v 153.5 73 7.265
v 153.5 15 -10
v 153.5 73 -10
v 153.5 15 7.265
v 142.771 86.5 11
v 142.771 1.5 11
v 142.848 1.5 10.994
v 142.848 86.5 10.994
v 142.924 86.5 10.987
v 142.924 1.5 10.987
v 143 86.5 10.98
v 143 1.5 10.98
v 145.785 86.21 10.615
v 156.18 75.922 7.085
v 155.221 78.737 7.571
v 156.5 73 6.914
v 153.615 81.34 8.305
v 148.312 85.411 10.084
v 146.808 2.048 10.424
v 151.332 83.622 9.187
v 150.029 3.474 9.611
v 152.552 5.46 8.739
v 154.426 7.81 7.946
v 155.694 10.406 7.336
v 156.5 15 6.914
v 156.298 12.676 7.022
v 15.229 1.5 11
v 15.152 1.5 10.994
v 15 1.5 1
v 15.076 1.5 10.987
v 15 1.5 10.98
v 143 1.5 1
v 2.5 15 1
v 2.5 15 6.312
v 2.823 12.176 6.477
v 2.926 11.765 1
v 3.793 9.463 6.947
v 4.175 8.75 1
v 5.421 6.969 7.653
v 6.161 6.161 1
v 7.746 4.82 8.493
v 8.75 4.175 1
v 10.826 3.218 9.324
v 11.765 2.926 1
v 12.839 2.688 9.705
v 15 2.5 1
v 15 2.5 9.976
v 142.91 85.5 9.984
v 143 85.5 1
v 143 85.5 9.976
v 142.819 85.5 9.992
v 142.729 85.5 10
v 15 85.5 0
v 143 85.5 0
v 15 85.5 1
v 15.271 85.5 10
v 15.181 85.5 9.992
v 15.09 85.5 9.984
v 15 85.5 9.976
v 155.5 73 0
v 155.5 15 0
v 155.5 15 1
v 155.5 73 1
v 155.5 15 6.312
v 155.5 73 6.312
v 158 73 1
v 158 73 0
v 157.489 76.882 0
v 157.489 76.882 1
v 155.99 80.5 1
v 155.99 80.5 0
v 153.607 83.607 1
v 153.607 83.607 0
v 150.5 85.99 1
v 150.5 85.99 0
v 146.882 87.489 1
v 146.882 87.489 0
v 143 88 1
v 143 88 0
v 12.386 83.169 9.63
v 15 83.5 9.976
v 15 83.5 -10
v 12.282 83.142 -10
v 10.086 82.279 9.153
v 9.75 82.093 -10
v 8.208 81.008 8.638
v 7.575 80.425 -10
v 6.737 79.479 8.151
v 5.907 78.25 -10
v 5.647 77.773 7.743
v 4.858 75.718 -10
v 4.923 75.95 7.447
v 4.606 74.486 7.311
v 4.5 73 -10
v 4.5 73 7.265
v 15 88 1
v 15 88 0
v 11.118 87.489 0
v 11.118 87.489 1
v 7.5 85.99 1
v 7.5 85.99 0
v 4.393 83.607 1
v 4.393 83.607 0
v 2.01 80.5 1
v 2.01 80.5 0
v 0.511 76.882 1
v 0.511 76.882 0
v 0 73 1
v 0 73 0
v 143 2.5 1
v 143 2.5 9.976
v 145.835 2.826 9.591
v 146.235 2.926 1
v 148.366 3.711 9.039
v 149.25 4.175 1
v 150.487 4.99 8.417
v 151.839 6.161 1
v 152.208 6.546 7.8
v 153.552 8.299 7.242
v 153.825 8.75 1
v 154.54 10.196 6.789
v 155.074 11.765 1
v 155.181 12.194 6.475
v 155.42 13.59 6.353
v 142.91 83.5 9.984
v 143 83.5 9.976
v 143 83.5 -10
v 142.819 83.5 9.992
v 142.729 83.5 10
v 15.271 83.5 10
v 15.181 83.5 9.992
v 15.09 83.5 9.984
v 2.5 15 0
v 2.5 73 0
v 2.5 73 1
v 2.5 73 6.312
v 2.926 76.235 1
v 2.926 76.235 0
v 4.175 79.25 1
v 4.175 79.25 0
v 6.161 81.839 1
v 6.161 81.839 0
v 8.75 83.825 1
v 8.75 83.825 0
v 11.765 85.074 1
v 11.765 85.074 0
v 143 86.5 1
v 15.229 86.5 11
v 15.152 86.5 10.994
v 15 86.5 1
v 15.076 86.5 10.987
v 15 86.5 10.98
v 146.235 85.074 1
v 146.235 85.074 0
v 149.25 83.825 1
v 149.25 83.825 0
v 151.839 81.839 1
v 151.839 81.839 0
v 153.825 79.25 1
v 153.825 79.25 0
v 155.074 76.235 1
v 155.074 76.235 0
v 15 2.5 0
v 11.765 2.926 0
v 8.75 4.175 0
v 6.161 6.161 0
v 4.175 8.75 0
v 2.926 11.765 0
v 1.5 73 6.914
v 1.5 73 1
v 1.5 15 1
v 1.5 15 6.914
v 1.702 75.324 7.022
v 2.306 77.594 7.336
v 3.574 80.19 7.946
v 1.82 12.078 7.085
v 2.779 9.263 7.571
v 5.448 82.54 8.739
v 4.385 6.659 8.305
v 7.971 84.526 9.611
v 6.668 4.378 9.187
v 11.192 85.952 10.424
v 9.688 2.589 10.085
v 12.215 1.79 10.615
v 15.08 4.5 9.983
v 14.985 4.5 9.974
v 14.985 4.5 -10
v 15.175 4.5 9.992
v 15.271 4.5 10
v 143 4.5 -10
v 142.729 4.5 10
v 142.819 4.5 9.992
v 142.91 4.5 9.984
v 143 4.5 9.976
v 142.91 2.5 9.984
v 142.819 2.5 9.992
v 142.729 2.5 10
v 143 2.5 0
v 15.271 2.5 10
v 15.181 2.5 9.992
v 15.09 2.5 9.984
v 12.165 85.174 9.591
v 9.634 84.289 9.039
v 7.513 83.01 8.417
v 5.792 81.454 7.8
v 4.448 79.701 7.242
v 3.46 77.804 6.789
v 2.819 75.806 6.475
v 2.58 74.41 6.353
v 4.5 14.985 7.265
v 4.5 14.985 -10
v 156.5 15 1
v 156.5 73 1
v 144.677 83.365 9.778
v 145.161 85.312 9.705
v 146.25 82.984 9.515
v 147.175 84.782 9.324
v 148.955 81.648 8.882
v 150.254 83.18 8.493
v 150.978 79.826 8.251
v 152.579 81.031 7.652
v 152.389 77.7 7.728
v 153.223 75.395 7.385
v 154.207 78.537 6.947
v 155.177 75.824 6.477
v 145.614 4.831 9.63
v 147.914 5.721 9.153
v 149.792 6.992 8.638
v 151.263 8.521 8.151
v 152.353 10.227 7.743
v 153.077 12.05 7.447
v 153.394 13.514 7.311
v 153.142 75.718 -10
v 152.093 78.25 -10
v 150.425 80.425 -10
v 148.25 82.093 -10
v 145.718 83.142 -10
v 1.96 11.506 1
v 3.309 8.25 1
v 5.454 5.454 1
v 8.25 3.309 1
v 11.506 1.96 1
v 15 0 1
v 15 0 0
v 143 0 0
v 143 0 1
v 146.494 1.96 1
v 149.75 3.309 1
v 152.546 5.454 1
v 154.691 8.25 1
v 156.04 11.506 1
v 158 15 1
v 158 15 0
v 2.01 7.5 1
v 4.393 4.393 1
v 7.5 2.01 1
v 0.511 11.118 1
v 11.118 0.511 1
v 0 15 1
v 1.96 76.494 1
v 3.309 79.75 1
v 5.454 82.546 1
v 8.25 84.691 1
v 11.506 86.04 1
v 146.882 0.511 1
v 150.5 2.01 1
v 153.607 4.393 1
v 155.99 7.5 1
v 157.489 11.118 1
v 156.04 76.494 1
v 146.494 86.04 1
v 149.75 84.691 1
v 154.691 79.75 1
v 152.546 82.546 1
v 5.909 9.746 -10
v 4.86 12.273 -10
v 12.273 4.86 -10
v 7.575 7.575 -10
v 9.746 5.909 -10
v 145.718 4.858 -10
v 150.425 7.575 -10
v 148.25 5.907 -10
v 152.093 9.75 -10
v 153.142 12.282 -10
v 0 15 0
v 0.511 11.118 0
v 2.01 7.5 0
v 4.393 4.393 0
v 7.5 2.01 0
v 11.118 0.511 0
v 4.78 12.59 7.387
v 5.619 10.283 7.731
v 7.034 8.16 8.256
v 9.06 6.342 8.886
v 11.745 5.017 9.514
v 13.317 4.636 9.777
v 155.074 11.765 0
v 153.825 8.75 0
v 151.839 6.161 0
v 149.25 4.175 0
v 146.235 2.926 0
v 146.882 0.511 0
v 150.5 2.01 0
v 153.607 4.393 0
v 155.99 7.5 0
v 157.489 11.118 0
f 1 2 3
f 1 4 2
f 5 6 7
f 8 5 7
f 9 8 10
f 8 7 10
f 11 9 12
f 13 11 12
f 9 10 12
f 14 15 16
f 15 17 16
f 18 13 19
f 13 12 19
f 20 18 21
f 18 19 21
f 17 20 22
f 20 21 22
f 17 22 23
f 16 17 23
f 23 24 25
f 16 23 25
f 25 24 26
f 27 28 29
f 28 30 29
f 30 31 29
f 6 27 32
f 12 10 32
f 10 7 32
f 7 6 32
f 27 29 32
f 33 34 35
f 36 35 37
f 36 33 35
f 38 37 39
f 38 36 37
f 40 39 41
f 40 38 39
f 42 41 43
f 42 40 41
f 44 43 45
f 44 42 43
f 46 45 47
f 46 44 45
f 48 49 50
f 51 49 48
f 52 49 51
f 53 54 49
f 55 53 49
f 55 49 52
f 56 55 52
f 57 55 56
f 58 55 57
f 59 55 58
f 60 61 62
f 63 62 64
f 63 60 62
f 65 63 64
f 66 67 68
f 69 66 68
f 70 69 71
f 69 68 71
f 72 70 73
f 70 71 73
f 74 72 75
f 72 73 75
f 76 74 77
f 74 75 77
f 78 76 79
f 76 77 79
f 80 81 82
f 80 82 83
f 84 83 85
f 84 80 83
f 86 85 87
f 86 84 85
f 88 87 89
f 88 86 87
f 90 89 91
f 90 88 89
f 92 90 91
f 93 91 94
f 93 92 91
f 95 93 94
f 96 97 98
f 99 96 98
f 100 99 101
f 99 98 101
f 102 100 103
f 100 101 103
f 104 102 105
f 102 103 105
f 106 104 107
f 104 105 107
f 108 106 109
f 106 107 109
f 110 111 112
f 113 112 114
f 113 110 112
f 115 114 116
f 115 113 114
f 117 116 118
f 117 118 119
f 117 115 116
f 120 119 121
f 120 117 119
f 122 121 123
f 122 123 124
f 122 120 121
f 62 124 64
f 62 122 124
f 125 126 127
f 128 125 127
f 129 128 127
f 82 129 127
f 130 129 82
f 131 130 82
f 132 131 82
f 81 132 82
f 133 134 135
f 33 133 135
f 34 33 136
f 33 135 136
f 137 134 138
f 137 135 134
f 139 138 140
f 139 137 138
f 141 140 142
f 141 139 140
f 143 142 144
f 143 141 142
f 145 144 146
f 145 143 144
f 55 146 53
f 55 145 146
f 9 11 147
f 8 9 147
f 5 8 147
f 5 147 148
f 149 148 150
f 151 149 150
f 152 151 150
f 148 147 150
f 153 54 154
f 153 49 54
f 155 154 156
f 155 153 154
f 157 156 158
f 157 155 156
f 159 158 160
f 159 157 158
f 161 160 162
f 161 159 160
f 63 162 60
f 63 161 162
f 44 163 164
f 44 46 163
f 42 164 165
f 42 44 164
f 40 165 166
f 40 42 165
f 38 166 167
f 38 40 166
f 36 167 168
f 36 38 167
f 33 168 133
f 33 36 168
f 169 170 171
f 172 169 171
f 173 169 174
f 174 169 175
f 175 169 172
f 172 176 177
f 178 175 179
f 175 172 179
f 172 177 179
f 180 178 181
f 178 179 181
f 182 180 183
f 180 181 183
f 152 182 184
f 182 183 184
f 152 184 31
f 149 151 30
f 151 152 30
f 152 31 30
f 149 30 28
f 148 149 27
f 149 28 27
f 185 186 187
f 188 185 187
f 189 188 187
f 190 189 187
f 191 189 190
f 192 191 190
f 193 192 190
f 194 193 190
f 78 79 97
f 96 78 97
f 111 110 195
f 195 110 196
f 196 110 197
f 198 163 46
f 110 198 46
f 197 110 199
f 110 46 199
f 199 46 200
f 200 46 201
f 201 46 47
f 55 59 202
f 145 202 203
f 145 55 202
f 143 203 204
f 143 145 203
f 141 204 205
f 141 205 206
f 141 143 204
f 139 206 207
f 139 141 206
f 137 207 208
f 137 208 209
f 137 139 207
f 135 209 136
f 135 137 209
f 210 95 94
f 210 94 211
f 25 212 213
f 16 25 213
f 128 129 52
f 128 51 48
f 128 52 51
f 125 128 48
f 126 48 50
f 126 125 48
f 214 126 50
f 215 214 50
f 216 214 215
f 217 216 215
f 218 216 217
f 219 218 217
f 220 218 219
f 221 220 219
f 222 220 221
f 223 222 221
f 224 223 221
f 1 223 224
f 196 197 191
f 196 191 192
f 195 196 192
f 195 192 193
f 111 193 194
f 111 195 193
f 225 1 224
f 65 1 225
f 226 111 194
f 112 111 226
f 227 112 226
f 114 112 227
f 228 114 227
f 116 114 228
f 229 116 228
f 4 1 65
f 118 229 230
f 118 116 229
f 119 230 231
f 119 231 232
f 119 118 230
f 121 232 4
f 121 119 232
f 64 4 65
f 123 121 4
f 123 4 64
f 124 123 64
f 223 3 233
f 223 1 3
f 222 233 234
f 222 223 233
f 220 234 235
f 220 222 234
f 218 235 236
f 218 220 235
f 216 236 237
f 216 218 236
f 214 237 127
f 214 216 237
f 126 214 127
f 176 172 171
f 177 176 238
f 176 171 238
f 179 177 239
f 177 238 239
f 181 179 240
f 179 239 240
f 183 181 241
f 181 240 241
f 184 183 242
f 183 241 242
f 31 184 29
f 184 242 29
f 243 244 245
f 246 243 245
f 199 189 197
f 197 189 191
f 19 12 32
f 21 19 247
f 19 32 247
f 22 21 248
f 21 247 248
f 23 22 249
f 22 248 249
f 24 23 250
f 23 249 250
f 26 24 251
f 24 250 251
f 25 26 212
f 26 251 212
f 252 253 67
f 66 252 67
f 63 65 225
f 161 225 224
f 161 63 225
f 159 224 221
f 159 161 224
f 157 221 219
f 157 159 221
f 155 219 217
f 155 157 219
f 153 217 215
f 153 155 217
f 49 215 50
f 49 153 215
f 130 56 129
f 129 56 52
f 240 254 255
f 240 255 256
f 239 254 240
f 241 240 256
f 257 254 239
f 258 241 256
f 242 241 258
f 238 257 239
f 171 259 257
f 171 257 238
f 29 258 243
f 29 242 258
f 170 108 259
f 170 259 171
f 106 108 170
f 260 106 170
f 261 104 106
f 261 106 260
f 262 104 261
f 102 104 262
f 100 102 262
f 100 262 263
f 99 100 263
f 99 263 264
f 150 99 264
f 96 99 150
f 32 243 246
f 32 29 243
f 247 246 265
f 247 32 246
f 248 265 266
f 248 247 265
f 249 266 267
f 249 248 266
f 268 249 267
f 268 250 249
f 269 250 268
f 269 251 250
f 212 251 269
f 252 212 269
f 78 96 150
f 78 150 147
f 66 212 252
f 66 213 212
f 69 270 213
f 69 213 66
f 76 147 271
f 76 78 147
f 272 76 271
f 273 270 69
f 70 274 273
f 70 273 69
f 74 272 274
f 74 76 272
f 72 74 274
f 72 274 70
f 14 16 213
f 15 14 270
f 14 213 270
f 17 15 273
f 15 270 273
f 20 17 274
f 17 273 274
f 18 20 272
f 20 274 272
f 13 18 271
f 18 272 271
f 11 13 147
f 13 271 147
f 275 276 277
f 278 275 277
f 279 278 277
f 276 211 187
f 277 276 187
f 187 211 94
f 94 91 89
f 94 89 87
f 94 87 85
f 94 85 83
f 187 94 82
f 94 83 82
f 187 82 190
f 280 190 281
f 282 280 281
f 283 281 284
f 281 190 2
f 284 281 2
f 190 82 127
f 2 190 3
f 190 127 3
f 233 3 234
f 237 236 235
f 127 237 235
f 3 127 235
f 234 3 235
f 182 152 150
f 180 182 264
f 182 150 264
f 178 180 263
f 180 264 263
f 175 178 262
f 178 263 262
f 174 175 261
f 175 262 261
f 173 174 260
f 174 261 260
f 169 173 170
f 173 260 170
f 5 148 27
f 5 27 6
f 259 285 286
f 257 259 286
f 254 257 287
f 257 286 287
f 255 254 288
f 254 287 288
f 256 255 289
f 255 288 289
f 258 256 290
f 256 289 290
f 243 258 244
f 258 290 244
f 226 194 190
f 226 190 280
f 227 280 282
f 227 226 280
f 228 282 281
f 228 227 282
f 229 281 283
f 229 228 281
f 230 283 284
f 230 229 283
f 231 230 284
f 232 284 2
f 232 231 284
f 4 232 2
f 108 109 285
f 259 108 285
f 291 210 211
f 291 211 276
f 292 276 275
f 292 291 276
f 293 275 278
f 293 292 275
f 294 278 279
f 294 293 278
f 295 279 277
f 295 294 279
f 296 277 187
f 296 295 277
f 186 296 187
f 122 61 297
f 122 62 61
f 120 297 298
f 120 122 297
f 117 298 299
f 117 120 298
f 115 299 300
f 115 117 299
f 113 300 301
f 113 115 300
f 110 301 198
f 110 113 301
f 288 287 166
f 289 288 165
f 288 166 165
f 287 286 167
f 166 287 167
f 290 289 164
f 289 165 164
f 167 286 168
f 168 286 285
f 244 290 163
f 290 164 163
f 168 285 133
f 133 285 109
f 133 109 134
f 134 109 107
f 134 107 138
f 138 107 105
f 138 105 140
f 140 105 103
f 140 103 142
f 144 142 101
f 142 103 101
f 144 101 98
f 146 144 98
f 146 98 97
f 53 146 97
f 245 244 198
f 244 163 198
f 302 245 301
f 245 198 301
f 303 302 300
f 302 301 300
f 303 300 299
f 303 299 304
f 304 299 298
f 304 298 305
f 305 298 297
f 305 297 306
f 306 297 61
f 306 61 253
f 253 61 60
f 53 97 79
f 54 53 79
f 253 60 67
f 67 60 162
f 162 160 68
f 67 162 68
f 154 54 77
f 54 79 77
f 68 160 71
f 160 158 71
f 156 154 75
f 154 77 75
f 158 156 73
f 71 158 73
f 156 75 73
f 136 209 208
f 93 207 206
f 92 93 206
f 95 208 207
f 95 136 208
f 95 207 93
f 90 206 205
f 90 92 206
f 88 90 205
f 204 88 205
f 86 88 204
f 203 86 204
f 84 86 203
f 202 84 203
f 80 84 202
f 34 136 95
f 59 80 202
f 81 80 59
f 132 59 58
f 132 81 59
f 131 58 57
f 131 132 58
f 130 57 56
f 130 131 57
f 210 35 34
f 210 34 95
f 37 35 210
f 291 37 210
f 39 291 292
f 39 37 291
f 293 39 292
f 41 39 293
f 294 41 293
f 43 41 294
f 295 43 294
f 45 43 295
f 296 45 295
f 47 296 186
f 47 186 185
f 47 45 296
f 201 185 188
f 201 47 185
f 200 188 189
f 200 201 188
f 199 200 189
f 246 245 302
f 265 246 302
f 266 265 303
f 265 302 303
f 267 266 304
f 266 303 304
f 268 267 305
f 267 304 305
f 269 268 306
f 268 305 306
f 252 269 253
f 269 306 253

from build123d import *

# Parameters (mm, degrees)
F1_DEPTH     = 1
F2_DEPTH     = 11
F4_DEPTH     = 88.001
F5_T         = 1
F5_T3_DEPTH  = 130
F5_T5_DEPTH  = 60
F5_T8_ANGLE  = 90.000000001
F5_T10_ANGLE = 90.000000001
F5_T12_ANGLE = 90.000000001
F5_T14_ANGLE = 90.000000001
F8_DEPTH     = 10


# Not quite as in the source:
# - a shell that OpenCascade refuses in one call is made with other operations: the cavity is built on its own and cut out


with BuildPart() as f1:
    # F0 (on Top) → F1 (new body)
    with BuildSketch(Plane.XY):
        with BuildLine():
            ThreePointArc((0, 15), (4.3933982822, 4.3933982822), (15, 0))
            Line((15, 0), (143, 0))
            ThreePointArc((143, 0), (153.6066017178, 4.3933982822), (158, 15))
            Line((158, 15), (158, 73))
            ThreePointArc((158, 73), (153.6066017178, 83.6066017178), (143, 88))
            Line((143, 88), (15, 88))
            ThreePointArc((15, 88), (4.3933982822, 83.6066017178), (0, 73))
            Line((0, 73), (0, 15))
        make_face()
        with BuildLine():
            ThreePointArc((1.5, 73), (5.454058454, 82.545941546), (15, 86.5))
            Line((15, 86.5), (143, 86.5))
            ThreePointArc((143, 86.5), (152.545941546, 82.545941546), (156.5, 73))
            Line((156.5, 73), (156.5, 15))
            ThreePointArc((156.5, 15), (152.545941546, 5.454058454), (143, 1.5))
            Line((143, 1.5), (15, 1.5))
            ThreePointArc((15, 1.5), (5.454058454, 5.454058454), (1.5, 15))
            Line((1.5, 15), (1.5, 73))
        make_face(mode=Mode.SUBTRACT)
    extrude(amount=F1_DEPTH)

    # F0 (on Top) → F2 (join)
    with BuildSketch(Plane.XY):
        with BuildLine():
            Line((143, 86.5), (15, 86.5))
            ThreePointArc((15, 86.5), (5.454058454, 82.545941546), (1.5, 73))
            Line((1.5, 73), (1.5, 15))
            ThreePointArc((1.5, 15), (5.454058454, 5.454058454), (15, 1.5))
            Line((15, 1.5), (143, 1.5))
            ThreePointArc((143, 1.5), (152.545941546, 5.454058454), (156.5, 15))
            Line((156.5, 15), (156.5, 73))
            ThreePointArc((156.5, 73), (152.545941546, 82.545941546), (143, 86.5))
        make_face()
    extrude(amount=F2_DEPTH)

    # F3 (on Front) → F4 (cut, through all)
    with BuildSketch(Plane.XZ):
        with BuildLine():
            ThreePointArc((0, 6.0560618341), (7.3283980564, 9.4088283813), (15.2286913721, 11))
            ThreePointArc((15.2286913721, 11), (15.6141911349, 11.030157259), (16, 11.0560618341))
            Line((16, 11.0560618341), (0, 11.0560618341))
            Line((0, 11.0560618341), (0, 6.0560618341))
        make_face()
        with BuildLine():
            ThreePointArc((142, 11.0560618341), (142.3858088651, 11.030157259), (142.7713086279, 11))
            ThreePointArc((142.7713086279, 11), (150.6716019436, 9.4088283813), (158, 6.0560618341))
            Line((158, 6.0560618341), (158, 11.0560618341))
            Line((158, 11.0560618341), (142, 11.0560618341))
        make_face()
    extrude(amount=-F4_DEPTH, mode=Mode.SUBTRACT)

    # F5: shell of thickness 1, made by hand


with BuildPart() as f5_core1:
    # F5_t2: copy of F1
    add(f1.part)

    # the walls: a layer under each face that stays
    f5_faces = [f5_core1.faces().sort_by_distance(p)[0] for p in [
        (0, 44, 0.5),
        (4.3933982822, 83.6066017178, 0.5),
        (4.3933982822, 4.3933982822, 0.5),
        (133.3125, 1.0864197531, 1),
        (79, 88, 0.5),
        (79, 0, 0.5),
        (153.6066017178, 4.3933982822, 0.5),
        (158, 44, 0.5),
        (153.6066017178, 83.6066017178, 0.5),
        (5.454058454, 82.545941546, 5.9900432581),
        (79, 86.5, 6),
        (152.545941546, 82.545941546, 5.9900432581),
        (156.5, 44, 3.9570518678),
        (152.545941546, 5.454058454, 5.9900432581),
        (79, 1.5, 6),
        (5.454058454, 5.454058454, 5.9900432581),
        (1.5, 44, 3.9570518678),
        (8.1534990202, 44, 9.6655007895),
        (79, 44, 11),
        (149.8465009798, 44, 9.6655007895),
    ]]
    thicken(f5_faces, amount=-F5_T, mode=Mode.SUBTRACT)

    # F5_s4 → F5_t3 (cut)
    with BuildSketch(Plane.YZ.offset(14)):
        Polygon((86.51, 1.01), (86.5, 0), (85.5, 0), (85.5, 1), align=None)
        Polygon((1.49, 1.01), (1.5, 0), (2.5, 0), (2.5, 1), align=None)
    extrude(amount=F5_T3_DEPTH, mode=Mode.SUBTRACT)

    # F5_s6 → F5_t5 (cut)
    with BuildSketch(Plane.XZ.offset(-74)):
        Polygon((156.51, 1.01), (156.5, 0), (155.5, 0), (155.5, 1), align=None)
        Polygon((1.49, 1.01), (1.5, 0), (2.5, 0), (2.5, 1), align=None)
    extrude(amount=F5_T5_DEPTH, mode=Mode.SUBTRACT)

    # F5_s7 → F5_t8 (revolve, cut)
    with BuildSketch(Plane.XZ.offset(-73)):
        Polygon((1.49, 1.01), (1.5, 0), (2.5, 0), (2.5, 1), align=None)
    revolve(axis=Axis((15, 73, 1), (0, 0, -1)), revolution_arc=F5_T8_ANGLE, mode=Mode.SUBTRACT)

    # F5_s9 → F5_t10 (revolve, cut)
    with BuildSketch(Plane.YZ.offset(143)):
        Polygon((86.51, 1.01), (86.5, 0), (85.5, 0), (85.5, 1), align=None)
    revolve(axis=Axis((143, 73, 1), (0, 0, -1)), revolution_arc=F5_T10_ANGLE, mode=Mode.SUBTRACT)

    # F5_s11 → F5_t12 (revolve, cut)
    with BuildSketch(Plane.XZ.offset(-15)):
        Polygon((156.51, 1.01), (156.5, 0), (155.5, 0), (155.5, 1), align=None)
    revolve(axis=Axis((143, 15, 1), (0, 0, -1)), revolution_arc=F5_T12_ANGLE, mode=Mode.SUBTRACT)

    # F5_s13 → F5_t14 (revolve, cut)
    with BuildSketch(Plane.YZ.offset(15)):
        Polygon((1.49, 1.01), (1.5, 0), (2.5, 0), (2.5, 1), align=None)
    revolve(axis=Axis((15, 15, 1), (0, 0, -1)), revolution_arc=F5_T14_ANGLE, mode=Mode.SUBTRACT)


with BuildPart() as f1_1:
    add(f1.part)

    # what is left inside the walls is the cavity
    f5_cavity = [f5_core1.part.solids().sort_by_distance(p)[0] for p in [
        (79, 30.166667, 0.01),
    ]]
    add(f5_cavity, mode=Mode.SUBTRACT)

    # F6 (on Top) → F7 (join, up to the next surface of F1)
    with BuildSketch(Plane.XY):
        with BuildLine():
            Line((143, 83.5), (15, 83.5))
            ThreePointArc((15, 83.5), (7.5753787975, 80.4246212025), (4.5, 73))
            Line((4.5000000324, 73), (4.5000000324, 14.9847623929))
            ThreePointArc((4.5000000324, 14.9847623929), (7.5753788898, 7.5753631149), (14.9847847018, 4.5))
            Line((14.9847847018, 4.5), (143, 4.5))
            ThreePointArc((143, 4.5), (150.4246212025, 7.5753787975), (153.5, 15))
            Line((153.5, 15), (153.5, 73))
            ThreePointArc((153.5, 73), (150.4246212025, 80.4246212025), (143, 83.5))
        make_face()
    extrude(until=Until.NEXT)

    # F6 (on Top) → F8 (join)
    with BuildSketch(Plane.XY):
        with BuildLine():
            Line((143, 83.5), (15, 83.5))
            ThreePointArc((15, 83.5), (7.5753787975, 80.4246212025), (4.5, 73))
            Line((4.5000000324, 73), (4.5000000324, 14.9847623929))
            ThreePointArc((4.5000000324, 14.9847623929), (7.5753788898, 7.5753631149), (14.9847847018, 4.5))
            Line((14.9847847018, 4.5), (143, 4.5))
            ThreePointArc((143, 4.5), (150.4246212025, 7.5753787975), (153.5, 15))
            Line((153.5, 15), (153.5, 73))
            ThreePointArc((153.5, 73), (150.4246212025, 80.4246212025), (143, 83.5))
        make_face()
    extrude(amount=-F8_DEPTH)


solid = f1_1.part
